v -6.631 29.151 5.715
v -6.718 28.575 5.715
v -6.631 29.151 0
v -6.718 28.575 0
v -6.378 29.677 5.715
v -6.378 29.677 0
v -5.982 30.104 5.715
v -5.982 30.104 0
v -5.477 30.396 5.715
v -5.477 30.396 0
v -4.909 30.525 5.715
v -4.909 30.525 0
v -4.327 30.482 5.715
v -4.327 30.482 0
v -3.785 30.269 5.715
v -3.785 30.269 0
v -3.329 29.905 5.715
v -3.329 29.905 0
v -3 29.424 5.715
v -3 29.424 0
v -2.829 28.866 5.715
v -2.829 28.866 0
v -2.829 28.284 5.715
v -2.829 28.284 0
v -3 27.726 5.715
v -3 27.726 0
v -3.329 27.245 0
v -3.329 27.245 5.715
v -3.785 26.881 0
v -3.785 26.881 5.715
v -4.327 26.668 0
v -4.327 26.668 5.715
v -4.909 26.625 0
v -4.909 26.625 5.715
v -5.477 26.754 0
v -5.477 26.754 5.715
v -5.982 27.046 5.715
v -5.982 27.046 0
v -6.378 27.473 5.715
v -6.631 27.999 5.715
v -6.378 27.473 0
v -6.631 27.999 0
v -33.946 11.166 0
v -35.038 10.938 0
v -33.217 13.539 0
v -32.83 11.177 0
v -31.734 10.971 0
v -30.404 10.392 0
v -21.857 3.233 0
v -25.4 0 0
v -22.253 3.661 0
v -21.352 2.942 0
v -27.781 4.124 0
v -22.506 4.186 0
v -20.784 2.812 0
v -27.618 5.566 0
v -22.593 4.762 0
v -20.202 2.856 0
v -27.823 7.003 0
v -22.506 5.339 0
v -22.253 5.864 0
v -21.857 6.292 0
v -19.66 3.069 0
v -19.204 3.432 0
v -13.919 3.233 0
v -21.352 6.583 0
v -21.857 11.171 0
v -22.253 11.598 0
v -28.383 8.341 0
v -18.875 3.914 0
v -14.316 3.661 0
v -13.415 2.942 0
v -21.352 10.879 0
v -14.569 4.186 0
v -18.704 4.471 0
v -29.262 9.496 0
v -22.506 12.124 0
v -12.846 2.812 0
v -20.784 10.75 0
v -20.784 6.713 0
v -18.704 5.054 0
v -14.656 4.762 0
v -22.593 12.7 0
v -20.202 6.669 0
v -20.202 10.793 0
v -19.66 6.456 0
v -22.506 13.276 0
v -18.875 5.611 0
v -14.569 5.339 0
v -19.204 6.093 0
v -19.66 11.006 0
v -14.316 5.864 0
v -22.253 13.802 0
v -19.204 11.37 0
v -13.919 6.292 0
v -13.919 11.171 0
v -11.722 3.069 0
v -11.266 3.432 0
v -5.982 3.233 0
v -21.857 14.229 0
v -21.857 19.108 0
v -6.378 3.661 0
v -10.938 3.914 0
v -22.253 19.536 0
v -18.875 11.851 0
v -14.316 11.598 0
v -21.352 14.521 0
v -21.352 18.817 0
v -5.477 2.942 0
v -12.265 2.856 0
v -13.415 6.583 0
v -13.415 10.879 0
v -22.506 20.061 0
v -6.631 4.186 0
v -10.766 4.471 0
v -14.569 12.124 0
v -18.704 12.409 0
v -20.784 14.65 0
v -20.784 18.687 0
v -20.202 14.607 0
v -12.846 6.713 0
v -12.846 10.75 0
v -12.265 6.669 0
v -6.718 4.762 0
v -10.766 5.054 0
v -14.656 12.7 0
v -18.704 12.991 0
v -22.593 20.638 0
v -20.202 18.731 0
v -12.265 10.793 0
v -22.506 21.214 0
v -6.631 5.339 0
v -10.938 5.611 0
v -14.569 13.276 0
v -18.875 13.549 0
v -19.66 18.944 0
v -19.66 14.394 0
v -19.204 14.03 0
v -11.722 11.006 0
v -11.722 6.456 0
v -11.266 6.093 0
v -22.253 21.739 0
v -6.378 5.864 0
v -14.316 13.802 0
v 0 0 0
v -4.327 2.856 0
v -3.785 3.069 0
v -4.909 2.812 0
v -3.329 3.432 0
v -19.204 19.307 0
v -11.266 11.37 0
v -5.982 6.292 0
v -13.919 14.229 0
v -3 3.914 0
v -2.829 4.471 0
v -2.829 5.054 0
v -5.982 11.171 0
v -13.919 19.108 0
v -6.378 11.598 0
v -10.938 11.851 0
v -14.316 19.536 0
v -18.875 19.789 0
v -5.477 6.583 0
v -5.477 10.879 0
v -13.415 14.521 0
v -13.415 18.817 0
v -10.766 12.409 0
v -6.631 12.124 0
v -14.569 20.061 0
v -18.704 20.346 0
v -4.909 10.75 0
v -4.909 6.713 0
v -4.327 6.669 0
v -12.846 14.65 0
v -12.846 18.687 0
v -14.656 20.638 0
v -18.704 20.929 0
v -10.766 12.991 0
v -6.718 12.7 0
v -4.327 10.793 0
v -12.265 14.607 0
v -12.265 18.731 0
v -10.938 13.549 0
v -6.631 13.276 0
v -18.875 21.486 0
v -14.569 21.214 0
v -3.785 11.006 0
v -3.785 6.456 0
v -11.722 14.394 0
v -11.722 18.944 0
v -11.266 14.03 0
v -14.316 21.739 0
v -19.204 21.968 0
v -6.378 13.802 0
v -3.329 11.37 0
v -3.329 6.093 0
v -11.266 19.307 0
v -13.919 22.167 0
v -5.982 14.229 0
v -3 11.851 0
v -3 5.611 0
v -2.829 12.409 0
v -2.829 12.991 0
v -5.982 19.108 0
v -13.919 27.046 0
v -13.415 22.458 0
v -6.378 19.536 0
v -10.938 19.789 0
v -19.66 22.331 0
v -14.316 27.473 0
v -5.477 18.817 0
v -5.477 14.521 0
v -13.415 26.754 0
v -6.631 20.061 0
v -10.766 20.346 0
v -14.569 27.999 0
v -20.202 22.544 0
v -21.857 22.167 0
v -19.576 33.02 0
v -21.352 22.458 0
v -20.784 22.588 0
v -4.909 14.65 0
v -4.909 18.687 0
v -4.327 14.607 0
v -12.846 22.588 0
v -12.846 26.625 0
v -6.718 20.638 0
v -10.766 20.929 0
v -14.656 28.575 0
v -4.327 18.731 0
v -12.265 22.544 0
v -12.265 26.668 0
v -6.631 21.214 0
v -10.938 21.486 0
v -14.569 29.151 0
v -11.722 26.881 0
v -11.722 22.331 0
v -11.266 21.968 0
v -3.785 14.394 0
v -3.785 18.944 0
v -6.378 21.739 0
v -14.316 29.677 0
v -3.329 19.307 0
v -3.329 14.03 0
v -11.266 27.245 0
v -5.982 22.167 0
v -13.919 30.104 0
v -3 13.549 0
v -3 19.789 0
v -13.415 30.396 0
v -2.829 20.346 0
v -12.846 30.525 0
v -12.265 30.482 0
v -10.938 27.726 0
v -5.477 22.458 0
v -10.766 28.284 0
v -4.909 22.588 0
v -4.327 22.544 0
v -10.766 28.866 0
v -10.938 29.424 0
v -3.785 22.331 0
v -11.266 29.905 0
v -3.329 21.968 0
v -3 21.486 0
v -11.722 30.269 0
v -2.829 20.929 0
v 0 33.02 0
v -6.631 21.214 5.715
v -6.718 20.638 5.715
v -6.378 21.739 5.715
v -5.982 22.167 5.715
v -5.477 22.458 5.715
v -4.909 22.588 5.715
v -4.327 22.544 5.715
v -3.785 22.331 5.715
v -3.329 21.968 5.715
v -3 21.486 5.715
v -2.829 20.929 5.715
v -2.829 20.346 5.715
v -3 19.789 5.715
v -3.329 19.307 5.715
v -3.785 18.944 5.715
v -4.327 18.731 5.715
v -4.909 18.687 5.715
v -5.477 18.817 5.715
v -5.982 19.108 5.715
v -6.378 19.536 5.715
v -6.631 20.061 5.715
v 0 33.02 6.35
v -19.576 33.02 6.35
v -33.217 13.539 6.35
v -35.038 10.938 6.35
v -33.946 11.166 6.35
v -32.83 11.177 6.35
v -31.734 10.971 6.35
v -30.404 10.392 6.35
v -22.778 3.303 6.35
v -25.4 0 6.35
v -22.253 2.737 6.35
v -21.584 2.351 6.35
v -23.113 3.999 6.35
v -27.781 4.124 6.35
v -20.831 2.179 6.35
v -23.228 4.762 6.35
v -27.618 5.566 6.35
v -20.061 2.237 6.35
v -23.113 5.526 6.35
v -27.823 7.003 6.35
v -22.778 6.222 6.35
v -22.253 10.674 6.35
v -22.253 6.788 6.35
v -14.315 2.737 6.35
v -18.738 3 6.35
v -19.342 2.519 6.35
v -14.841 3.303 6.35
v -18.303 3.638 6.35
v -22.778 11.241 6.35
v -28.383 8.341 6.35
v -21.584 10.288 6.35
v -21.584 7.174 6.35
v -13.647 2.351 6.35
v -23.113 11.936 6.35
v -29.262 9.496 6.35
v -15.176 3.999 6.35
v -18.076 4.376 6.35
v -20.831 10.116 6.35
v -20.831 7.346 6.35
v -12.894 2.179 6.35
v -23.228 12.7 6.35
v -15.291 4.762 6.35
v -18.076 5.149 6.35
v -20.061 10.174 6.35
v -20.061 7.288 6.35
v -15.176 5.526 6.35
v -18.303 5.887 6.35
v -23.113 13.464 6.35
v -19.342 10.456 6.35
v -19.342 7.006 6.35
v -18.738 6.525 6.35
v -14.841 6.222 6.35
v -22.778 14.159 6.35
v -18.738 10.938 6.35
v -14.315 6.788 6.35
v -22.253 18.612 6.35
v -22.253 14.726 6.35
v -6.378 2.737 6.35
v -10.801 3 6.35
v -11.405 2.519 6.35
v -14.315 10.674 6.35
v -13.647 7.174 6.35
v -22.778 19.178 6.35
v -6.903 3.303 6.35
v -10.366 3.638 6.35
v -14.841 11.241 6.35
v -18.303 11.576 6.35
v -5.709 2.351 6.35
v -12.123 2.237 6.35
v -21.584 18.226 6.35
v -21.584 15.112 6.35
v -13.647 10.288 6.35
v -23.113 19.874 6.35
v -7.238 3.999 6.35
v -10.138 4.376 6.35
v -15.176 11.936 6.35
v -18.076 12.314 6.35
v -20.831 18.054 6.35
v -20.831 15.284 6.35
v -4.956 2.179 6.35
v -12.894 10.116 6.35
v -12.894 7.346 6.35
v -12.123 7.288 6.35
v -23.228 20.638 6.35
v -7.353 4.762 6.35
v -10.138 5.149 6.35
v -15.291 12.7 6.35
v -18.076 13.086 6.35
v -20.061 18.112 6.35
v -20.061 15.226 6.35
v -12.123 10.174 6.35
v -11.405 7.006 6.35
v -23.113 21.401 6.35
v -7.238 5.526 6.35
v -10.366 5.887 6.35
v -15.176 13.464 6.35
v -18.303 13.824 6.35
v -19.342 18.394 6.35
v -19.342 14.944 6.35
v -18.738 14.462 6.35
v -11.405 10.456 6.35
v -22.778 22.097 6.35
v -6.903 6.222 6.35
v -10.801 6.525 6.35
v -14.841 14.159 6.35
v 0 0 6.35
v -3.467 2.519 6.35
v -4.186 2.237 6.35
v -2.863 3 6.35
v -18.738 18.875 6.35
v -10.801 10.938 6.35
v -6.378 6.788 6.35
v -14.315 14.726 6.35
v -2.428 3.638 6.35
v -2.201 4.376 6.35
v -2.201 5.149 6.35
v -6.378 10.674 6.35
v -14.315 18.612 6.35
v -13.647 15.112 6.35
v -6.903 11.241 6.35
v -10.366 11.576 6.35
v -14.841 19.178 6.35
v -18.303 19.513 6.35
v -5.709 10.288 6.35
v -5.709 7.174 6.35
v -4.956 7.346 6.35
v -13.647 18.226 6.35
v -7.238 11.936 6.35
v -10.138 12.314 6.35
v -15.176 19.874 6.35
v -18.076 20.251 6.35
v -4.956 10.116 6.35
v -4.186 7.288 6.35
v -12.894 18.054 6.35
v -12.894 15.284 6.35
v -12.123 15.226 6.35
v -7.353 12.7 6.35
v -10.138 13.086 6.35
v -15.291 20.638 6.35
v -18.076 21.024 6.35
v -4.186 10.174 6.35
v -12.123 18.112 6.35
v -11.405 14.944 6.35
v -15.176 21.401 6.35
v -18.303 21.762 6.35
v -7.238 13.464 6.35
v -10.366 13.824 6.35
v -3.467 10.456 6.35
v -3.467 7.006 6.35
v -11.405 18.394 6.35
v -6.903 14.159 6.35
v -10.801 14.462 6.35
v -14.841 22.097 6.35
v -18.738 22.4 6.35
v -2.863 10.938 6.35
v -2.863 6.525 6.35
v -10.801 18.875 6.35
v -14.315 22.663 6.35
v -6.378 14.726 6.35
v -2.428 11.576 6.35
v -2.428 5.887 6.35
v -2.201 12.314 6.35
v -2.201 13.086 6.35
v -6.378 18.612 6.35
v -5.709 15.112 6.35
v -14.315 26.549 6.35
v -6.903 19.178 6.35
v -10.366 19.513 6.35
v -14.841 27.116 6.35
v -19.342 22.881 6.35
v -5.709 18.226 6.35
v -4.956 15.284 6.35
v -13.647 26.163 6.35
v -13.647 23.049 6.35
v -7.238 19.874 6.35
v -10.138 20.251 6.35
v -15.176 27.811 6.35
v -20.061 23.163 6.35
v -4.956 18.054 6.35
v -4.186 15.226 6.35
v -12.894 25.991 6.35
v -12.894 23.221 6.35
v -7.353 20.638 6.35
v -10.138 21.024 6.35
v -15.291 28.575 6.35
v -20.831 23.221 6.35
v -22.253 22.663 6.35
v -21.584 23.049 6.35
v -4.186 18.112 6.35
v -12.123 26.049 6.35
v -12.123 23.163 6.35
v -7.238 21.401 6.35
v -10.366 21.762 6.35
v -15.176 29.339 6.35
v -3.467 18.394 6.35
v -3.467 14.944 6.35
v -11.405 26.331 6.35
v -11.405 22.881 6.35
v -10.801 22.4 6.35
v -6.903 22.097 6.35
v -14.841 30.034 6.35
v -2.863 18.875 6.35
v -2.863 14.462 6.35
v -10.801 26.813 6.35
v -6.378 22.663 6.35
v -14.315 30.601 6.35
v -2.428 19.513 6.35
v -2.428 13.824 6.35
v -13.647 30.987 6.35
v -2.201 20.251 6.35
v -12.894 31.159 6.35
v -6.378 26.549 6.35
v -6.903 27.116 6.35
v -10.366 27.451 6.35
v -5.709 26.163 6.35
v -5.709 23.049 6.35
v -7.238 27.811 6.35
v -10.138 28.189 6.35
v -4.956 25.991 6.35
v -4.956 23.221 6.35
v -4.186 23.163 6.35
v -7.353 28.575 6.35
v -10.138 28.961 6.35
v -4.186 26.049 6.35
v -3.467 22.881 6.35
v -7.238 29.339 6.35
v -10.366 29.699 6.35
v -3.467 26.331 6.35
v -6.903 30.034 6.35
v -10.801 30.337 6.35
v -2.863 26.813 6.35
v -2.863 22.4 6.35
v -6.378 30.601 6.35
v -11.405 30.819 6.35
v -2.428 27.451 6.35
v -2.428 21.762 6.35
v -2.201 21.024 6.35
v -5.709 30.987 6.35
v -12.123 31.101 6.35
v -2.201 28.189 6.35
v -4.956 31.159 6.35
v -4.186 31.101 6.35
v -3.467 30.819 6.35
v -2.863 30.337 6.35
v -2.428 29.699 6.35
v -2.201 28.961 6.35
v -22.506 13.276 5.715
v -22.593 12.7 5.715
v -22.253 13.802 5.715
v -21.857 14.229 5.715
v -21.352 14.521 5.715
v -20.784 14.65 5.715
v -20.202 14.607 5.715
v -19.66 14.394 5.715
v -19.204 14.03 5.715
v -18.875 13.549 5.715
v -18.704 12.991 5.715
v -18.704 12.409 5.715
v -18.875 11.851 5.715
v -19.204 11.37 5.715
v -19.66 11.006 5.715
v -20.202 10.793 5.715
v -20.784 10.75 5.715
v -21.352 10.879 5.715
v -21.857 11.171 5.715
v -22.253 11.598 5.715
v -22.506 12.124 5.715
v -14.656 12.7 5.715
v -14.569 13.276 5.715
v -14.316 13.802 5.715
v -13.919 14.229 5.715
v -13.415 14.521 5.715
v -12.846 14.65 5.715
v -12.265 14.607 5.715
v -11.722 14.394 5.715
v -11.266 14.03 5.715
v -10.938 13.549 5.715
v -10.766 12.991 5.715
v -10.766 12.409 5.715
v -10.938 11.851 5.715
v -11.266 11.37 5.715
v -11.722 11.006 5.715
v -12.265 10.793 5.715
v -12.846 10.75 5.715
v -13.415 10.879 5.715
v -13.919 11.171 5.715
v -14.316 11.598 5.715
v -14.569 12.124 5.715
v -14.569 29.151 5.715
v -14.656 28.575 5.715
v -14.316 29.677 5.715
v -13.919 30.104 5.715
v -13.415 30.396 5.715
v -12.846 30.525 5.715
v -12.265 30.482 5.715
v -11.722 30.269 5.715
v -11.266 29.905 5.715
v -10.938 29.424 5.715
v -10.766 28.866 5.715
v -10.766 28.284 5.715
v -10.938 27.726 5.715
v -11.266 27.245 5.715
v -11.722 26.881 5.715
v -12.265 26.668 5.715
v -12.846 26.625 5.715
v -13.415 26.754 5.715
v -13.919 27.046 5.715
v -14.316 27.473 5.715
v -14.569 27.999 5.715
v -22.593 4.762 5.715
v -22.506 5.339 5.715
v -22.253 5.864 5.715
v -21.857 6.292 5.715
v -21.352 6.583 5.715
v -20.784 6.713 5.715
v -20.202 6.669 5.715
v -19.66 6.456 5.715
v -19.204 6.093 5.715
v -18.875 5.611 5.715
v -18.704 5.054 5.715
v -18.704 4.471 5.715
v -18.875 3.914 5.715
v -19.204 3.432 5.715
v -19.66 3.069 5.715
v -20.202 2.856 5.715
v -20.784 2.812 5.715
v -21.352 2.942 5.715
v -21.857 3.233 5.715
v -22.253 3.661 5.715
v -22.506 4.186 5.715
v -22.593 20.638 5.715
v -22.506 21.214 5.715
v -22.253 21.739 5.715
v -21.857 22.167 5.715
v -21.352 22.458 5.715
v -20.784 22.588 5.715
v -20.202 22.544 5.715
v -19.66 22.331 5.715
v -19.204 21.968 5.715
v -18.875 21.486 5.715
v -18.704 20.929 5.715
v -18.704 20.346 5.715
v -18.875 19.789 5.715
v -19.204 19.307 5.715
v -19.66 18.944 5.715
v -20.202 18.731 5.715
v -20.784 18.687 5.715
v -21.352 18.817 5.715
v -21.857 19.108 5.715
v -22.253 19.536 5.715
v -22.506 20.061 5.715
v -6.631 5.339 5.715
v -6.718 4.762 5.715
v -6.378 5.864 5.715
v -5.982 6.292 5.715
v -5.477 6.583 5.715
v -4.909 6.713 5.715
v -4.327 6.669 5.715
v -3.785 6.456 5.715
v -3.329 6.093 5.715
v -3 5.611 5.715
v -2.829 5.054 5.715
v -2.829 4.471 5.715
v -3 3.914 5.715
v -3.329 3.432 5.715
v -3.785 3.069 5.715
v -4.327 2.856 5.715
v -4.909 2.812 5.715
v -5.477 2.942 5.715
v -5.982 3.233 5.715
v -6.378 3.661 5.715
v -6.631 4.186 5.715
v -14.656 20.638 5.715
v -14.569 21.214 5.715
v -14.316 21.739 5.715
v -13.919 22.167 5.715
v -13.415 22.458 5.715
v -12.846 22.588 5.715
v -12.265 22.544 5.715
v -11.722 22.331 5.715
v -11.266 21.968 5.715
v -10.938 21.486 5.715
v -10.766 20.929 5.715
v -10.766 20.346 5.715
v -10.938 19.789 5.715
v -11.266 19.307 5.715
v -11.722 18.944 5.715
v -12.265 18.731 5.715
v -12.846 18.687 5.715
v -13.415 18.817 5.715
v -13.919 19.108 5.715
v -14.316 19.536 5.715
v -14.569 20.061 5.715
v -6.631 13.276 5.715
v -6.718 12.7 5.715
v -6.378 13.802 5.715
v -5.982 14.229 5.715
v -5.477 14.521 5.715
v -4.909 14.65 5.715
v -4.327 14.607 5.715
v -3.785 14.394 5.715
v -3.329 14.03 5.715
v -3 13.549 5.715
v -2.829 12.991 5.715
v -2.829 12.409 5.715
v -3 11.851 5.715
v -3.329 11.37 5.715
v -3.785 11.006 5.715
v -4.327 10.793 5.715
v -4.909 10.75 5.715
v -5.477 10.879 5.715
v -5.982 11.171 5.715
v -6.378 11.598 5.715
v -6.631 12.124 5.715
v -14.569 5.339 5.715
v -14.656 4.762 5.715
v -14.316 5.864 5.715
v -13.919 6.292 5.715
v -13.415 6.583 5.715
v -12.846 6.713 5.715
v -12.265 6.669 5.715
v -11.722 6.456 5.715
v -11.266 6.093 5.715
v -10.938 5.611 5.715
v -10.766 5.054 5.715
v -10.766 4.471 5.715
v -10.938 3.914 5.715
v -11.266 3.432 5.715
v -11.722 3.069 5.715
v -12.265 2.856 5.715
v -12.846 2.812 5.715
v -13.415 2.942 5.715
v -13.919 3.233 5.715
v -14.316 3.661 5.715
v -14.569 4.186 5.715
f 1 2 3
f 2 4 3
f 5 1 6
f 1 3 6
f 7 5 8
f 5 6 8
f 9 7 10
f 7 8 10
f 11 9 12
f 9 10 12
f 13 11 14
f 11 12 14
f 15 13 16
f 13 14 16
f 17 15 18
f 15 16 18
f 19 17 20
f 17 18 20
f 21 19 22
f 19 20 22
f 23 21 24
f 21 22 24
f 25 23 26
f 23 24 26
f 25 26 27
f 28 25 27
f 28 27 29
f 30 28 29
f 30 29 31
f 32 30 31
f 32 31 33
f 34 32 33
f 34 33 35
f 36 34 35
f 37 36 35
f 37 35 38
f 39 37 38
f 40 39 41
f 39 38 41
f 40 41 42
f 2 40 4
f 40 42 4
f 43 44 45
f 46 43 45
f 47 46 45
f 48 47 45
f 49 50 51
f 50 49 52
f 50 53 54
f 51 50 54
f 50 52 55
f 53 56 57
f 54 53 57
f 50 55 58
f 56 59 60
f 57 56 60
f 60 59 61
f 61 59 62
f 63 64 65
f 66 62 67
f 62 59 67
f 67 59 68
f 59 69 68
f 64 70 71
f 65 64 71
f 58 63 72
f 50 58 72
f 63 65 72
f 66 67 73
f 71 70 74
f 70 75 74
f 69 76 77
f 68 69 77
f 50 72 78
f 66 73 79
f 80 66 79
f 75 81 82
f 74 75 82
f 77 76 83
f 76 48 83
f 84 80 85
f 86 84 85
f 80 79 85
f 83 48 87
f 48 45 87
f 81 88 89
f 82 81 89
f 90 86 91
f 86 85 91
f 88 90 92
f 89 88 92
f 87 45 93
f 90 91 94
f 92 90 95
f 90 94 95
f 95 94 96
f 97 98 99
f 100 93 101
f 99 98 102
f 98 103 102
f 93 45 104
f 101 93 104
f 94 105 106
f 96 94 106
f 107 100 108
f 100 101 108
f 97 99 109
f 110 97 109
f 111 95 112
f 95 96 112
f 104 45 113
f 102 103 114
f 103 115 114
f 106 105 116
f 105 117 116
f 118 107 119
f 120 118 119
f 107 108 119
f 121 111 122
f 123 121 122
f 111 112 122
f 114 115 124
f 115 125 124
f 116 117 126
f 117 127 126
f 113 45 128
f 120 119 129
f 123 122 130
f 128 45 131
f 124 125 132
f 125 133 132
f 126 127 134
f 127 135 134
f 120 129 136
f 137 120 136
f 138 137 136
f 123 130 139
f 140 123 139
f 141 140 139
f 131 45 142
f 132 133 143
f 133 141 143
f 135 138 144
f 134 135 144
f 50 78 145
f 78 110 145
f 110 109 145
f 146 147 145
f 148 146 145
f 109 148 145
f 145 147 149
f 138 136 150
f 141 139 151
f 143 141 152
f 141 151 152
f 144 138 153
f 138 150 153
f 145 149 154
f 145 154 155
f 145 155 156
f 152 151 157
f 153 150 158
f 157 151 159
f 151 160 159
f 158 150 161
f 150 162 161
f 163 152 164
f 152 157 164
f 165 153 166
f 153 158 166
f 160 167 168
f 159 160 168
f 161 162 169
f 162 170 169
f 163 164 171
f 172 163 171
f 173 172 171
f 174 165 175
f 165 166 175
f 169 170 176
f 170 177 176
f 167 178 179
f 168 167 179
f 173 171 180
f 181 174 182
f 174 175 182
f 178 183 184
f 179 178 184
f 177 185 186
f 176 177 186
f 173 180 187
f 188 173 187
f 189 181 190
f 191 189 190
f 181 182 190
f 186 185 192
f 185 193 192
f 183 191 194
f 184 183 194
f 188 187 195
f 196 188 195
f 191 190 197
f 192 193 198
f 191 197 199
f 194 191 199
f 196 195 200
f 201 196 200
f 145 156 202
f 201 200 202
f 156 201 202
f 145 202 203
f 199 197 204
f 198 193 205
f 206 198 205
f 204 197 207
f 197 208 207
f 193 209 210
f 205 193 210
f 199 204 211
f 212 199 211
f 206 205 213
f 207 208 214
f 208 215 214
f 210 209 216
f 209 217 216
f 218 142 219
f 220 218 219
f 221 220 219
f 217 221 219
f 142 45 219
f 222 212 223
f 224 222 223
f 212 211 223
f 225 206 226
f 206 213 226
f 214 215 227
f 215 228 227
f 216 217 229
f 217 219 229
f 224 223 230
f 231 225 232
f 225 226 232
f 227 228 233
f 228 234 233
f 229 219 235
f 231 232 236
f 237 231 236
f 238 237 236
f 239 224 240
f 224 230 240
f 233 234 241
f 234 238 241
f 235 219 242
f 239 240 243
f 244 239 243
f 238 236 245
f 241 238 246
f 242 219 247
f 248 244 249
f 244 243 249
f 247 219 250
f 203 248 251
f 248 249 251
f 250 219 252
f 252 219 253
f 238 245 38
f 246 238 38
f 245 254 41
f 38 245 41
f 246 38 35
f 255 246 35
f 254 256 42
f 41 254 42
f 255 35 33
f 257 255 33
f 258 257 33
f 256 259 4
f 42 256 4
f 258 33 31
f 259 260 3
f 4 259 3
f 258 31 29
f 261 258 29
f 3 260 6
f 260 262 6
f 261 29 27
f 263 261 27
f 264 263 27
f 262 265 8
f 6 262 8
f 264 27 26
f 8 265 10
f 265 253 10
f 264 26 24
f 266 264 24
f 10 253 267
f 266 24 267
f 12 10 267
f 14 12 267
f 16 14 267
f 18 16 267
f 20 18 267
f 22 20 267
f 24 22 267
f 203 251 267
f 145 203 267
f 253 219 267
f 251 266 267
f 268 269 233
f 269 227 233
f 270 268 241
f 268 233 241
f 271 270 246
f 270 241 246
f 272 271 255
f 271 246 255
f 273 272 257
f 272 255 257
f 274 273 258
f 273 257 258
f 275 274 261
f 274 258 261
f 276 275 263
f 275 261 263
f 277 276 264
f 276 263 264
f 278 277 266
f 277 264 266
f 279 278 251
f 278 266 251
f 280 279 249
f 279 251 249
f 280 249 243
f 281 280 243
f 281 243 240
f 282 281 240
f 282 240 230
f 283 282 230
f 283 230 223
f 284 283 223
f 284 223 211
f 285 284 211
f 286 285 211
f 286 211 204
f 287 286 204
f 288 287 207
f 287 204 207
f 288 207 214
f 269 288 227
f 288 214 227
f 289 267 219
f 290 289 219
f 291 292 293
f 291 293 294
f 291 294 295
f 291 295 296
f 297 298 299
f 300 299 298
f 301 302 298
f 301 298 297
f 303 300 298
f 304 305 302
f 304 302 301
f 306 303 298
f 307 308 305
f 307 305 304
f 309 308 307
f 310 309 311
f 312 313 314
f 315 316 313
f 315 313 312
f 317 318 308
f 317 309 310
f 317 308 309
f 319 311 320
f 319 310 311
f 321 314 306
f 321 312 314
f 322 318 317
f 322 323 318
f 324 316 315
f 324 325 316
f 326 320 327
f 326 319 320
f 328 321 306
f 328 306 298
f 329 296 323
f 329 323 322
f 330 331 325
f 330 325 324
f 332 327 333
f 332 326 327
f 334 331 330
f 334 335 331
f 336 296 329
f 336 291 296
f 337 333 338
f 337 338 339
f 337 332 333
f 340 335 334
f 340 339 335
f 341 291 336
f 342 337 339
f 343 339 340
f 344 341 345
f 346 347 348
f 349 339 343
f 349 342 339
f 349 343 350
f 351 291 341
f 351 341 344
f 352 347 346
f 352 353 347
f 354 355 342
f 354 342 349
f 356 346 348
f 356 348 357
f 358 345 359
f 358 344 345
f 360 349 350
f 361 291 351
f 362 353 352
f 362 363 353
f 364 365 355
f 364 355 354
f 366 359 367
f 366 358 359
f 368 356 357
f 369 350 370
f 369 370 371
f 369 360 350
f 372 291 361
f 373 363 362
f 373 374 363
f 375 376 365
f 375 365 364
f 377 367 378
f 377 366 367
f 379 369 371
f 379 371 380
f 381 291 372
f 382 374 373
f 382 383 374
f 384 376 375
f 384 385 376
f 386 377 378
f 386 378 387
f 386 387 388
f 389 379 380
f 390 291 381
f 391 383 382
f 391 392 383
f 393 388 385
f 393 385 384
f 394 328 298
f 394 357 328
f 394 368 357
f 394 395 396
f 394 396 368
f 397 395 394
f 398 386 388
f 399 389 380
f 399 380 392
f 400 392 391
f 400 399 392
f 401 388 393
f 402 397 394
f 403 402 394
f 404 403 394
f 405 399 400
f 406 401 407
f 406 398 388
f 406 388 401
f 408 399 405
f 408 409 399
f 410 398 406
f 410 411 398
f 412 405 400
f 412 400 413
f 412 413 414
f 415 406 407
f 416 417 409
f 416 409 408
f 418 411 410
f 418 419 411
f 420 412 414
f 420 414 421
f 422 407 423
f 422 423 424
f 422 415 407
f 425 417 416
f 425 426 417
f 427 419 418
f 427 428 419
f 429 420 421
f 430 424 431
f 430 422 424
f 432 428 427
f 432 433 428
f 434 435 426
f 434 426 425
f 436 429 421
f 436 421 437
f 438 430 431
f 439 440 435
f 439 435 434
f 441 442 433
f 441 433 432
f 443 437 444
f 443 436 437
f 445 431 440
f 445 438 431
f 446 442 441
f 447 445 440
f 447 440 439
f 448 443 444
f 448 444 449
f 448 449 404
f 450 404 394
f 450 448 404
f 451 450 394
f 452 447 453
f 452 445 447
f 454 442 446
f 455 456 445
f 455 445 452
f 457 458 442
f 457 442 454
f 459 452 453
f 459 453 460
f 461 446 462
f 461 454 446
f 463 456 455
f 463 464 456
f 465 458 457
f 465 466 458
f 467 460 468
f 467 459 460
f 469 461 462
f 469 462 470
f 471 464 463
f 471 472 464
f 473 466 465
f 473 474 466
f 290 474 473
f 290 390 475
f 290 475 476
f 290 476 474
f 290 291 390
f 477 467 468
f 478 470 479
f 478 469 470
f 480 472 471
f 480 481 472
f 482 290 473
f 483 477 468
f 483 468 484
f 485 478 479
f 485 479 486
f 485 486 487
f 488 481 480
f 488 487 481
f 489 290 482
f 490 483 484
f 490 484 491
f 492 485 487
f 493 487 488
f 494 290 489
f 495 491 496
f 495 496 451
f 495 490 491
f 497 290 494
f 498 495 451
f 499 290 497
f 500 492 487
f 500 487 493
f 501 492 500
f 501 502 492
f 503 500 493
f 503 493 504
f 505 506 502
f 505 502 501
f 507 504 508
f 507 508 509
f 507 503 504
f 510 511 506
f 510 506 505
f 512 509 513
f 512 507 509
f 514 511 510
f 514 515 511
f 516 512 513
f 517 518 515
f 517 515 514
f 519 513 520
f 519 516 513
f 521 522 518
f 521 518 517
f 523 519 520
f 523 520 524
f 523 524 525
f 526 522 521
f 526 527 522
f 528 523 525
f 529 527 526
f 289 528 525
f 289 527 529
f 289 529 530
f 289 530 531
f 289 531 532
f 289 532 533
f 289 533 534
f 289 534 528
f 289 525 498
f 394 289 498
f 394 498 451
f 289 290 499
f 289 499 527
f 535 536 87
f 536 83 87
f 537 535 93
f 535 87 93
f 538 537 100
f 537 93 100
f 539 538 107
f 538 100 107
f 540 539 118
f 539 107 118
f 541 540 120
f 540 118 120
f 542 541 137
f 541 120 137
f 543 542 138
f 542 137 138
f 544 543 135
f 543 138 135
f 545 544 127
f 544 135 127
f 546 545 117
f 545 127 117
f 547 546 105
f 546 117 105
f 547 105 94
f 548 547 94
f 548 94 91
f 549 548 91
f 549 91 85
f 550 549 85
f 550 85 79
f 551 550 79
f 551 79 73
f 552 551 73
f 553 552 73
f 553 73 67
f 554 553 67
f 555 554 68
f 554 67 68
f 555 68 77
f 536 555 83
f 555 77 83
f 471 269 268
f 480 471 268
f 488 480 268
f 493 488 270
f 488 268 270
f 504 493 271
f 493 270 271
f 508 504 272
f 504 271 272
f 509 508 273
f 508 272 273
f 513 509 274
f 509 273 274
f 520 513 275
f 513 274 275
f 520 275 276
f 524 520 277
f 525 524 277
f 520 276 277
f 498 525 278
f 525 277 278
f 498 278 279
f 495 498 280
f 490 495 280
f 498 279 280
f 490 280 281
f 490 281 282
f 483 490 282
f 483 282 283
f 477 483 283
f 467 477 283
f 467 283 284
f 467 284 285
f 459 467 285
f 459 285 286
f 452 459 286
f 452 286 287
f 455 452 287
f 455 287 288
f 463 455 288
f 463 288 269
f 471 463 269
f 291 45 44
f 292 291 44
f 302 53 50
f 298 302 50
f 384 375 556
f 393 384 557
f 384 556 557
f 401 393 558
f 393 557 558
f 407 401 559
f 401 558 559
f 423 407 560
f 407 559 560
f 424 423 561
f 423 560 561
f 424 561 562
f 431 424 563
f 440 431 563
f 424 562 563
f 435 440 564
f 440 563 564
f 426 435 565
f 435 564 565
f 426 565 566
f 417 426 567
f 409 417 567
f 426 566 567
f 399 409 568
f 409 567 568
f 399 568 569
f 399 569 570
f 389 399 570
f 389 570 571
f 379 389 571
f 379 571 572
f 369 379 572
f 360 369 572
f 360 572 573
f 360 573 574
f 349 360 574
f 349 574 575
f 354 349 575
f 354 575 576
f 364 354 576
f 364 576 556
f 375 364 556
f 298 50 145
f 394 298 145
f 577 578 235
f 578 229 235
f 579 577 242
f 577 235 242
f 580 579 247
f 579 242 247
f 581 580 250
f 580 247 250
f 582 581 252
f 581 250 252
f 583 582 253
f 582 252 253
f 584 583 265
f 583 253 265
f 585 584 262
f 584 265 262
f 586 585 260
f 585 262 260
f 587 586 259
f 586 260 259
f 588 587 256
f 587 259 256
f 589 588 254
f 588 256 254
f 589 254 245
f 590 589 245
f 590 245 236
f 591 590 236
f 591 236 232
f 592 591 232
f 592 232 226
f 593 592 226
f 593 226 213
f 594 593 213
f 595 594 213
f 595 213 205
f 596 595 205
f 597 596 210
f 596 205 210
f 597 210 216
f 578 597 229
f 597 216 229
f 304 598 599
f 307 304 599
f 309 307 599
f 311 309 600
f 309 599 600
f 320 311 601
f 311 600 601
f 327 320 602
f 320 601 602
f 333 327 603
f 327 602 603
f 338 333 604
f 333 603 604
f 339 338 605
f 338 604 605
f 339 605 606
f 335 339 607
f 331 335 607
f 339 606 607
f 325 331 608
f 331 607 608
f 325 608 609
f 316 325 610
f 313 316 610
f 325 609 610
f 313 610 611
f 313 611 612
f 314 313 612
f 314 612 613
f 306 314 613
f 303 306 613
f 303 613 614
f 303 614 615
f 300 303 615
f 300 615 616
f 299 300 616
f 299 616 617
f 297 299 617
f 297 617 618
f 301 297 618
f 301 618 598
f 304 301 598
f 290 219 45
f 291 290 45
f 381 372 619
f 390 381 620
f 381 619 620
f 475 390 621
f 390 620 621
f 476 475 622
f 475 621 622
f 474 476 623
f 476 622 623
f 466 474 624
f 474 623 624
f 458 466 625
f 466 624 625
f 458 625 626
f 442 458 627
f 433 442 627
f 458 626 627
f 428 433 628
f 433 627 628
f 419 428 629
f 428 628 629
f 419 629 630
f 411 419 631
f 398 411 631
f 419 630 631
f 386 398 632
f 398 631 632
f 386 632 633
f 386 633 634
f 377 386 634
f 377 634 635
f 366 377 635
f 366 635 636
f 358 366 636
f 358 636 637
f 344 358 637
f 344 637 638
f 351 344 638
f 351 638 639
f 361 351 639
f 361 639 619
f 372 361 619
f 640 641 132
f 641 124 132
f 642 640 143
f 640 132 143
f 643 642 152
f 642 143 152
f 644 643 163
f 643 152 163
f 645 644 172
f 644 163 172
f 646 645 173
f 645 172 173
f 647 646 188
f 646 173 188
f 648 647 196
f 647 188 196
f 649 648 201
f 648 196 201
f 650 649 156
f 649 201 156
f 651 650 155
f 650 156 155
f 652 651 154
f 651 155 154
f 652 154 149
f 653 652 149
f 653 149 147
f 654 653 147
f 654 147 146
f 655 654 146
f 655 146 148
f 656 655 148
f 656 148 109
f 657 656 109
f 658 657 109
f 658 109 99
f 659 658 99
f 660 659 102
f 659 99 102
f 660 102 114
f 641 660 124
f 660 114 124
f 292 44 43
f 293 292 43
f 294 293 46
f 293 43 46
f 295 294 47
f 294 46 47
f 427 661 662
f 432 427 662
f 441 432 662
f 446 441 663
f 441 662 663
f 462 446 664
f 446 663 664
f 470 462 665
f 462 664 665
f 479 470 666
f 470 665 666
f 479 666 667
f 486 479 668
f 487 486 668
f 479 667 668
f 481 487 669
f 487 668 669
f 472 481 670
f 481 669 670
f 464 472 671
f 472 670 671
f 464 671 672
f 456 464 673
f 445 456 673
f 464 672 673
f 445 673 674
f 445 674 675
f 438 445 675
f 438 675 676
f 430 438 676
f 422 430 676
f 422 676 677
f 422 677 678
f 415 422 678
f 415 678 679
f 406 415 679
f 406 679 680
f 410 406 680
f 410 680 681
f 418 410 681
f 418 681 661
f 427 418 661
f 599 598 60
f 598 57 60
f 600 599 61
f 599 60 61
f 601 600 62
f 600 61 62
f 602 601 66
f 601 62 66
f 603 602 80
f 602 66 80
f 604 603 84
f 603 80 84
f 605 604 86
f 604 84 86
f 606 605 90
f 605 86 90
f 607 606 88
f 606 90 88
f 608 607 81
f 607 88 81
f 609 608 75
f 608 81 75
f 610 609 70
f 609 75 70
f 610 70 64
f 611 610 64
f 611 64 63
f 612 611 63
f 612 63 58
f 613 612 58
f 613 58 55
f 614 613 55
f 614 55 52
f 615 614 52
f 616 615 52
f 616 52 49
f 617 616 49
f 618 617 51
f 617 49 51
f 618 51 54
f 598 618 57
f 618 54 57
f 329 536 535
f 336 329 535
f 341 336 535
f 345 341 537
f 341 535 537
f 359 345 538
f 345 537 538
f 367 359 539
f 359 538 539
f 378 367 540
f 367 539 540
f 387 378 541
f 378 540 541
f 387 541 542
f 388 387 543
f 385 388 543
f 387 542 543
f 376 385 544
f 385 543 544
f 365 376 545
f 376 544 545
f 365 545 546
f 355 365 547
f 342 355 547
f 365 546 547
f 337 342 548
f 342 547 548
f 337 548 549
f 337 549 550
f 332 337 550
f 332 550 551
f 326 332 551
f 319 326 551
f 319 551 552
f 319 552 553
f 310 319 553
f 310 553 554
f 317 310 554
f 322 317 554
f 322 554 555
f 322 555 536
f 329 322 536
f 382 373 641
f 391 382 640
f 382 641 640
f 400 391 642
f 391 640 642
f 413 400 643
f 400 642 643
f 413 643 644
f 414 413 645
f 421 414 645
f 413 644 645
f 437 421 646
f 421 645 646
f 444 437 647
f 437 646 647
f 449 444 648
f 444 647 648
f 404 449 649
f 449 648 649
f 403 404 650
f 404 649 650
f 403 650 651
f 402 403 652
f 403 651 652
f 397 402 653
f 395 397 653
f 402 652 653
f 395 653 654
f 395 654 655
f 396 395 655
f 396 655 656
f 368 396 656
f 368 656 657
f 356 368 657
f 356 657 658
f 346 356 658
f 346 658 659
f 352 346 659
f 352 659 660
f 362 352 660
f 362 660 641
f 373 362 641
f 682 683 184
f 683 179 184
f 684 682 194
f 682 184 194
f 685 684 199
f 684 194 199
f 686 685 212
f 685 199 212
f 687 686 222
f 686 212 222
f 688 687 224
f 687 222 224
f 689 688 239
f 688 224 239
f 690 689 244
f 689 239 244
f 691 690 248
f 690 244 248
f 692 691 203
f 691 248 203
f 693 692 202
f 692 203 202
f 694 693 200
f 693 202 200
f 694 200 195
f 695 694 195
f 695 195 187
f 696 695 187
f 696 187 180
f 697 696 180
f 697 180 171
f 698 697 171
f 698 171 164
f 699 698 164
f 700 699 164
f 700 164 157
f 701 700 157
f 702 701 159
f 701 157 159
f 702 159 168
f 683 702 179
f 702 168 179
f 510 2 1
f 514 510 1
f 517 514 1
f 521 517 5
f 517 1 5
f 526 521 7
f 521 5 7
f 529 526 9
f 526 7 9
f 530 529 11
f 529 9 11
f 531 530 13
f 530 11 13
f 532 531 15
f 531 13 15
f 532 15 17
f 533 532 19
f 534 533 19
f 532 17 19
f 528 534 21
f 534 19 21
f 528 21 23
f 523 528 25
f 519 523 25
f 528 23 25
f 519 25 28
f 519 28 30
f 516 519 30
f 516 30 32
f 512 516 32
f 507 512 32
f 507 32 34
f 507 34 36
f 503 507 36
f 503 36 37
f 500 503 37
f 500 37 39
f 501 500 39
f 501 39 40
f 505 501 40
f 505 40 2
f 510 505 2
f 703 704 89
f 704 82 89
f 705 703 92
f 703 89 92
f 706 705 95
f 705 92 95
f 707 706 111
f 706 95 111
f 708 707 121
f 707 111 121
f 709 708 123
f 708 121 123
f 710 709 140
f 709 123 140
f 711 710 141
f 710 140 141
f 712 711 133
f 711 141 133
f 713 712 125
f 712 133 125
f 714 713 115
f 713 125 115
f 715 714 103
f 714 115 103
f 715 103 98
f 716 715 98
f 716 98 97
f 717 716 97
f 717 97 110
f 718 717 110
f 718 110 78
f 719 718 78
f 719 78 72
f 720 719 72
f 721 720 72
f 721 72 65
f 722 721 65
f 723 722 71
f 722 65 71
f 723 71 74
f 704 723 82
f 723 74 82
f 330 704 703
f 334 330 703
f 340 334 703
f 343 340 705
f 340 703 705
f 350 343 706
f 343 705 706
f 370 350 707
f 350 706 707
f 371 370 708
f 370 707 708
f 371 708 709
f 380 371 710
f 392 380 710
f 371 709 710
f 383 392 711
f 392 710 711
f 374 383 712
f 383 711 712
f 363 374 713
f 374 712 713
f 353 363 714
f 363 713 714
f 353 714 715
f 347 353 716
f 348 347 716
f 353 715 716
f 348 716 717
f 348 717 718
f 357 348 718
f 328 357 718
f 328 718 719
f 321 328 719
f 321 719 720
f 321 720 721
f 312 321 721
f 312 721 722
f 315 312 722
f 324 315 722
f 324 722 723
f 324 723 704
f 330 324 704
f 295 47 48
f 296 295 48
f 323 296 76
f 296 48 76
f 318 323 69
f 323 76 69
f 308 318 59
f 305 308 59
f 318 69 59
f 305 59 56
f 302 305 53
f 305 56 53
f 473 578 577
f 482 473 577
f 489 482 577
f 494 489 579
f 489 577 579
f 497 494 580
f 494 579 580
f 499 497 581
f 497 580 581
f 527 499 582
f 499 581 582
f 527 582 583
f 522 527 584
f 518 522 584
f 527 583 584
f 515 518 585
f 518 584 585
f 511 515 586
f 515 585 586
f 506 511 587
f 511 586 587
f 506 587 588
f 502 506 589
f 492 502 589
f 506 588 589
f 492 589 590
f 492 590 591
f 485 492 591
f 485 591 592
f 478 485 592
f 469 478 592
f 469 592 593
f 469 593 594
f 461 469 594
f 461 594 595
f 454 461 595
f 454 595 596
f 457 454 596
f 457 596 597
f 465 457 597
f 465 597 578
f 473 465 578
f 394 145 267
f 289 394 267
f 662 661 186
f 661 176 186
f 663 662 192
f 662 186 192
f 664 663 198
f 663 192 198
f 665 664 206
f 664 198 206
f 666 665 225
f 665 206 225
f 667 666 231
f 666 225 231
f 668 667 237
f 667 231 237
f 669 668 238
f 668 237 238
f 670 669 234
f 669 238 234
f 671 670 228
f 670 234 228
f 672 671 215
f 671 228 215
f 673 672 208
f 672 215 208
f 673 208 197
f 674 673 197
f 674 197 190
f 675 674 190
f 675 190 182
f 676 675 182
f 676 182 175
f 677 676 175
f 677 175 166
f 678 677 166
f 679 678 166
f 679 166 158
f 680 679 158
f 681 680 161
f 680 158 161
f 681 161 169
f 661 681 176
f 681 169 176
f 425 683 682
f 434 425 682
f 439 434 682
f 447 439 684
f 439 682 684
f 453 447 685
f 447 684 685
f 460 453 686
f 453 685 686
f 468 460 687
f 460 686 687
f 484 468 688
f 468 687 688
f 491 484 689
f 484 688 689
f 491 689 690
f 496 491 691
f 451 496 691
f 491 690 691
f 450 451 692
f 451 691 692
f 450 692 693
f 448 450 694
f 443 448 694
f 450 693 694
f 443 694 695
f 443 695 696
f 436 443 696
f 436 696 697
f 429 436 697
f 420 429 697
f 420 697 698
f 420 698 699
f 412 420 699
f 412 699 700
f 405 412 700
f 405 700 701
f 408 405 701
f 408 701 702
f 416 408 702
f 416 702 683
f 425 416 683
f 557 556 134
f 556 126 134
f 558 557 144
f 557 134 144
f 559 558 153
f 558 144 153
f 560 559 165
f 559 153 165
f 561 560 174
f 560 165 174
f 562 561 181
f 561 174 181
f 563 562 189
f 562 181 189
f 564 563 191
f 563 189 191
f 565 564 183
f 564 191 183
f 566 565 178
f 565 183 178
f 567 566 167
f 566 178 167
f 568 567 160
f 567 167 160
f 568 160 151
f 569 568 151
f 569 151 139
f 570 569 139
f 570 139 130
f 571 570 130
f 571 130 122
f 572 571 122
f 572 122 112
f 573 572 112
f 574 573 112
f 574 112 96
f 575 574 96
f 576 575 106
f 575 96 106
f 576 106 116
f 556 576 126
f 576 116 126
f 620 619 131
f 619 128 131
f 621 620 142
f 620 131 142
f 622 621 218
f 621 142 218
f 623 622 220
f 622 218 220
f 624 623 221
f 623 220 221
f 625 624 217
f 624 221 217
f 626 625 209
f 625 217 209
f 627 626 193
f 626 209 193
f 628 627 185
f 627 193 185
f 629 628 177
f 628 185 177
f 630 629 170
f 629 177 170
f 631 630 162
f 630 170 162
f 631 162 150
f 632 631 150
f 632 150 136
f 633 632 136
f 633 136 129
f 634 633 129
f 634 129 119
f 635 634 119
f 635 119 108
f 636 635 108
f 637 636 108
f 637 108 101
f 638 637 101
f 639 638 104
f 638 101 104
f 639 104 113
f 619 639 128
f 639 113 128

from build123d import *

# Parameters (mm, degrees)
BOSS_EXTRUDE1_DEPTH                   = 6.35
F_23_0_154_DIAMETER_HOLE1_D           = 3.9116
F_23_0_154_DIAMETER_HOLE1_CSINK_D     = 5.1816
F_23_0_154_DIAMETER_HOLE1_CSINK_ANGLE = 90
LPATTERN1_COUNT                       = 4
LPATTERN1_PITCH                       = 7.9375
LPATTERN1_COUNT_DIR2                  = 3
LPATTERN1_PITCH_DIR2                  = 7.9375


with BuildPart() as part:
    # Sketch1 → Boss-Extrude1 (new body)
    with BuildSketch(Plane.XY):
        with BuildLine():
            Line((-25.4, 0), (0, 0))
            Line((0, 0), (0, 33.02))
            Line((0, 33.02), (-19.576328296, 33.02))
            Line((-19.576328296, 33.02), (-33.216892644, 13.539255216))
            Line((-33.216892644, 13.539255216), (-31.734093122, 10.970971108))
            ThreePointArc((-31.734093122, 10.970971108), (-28.382856233, 8.341458547), (-27.78125, 4.124445986))
            Line((-27.78125, 4.124445986), (-25.4, 0))
        make_face()
        with BuildLine():
            Line((-31.734093122, 10.970971108), (-33.216892644, 13.539255216))
            Line((-33.216892644, 13.539255216), (-35.037997829, 10.938447476))
            ThreePointArc((-35.037997829, 10.938447476), (-33.388447139, 11.198681663), (-31.734093122, 10.970971108))
        make_face()
    extrude(amount=BOSS_EXTRUDE1_DEPTH)

    # #23 (0.154) Diameter Hole1 (through all)
    with Locations(Plane(origin=(-4.7625, 4.7625, 6.35), x_dir=(1, 0, 0), z_dir=(0, 0, 1))):
        with Locations((0, 0)):
            f_23_0_154_diameter_hole1 = CounterSinkHole(F_23_0_154_DIAMETER_HOLE1_D / 2, F_23_0_154_DIAMETER_HOLE1_CSINK_D / 2, counter_sink_angle=F_23_0_154_DIAMETER_HOLE1_CSINK_ANGLE)

    # LPattern1: 23 _0.154_ Diameter Hole1 4 × 3, 1 skipped
    with Locations(*[(-j * LPATTERN1_PITCH_DIR2, i * LPATTERN1_PITCH, 0) for i in range(LPATTERN1_COUNT) for j in range(LPATTERN1_COUNT_DIR2) if (i, j) not in ((0, 0), (3, 2))]):
        add(f_23_0_154_diameter_hole1, mode=Mode.SUBTRACT)


solid = part.part
